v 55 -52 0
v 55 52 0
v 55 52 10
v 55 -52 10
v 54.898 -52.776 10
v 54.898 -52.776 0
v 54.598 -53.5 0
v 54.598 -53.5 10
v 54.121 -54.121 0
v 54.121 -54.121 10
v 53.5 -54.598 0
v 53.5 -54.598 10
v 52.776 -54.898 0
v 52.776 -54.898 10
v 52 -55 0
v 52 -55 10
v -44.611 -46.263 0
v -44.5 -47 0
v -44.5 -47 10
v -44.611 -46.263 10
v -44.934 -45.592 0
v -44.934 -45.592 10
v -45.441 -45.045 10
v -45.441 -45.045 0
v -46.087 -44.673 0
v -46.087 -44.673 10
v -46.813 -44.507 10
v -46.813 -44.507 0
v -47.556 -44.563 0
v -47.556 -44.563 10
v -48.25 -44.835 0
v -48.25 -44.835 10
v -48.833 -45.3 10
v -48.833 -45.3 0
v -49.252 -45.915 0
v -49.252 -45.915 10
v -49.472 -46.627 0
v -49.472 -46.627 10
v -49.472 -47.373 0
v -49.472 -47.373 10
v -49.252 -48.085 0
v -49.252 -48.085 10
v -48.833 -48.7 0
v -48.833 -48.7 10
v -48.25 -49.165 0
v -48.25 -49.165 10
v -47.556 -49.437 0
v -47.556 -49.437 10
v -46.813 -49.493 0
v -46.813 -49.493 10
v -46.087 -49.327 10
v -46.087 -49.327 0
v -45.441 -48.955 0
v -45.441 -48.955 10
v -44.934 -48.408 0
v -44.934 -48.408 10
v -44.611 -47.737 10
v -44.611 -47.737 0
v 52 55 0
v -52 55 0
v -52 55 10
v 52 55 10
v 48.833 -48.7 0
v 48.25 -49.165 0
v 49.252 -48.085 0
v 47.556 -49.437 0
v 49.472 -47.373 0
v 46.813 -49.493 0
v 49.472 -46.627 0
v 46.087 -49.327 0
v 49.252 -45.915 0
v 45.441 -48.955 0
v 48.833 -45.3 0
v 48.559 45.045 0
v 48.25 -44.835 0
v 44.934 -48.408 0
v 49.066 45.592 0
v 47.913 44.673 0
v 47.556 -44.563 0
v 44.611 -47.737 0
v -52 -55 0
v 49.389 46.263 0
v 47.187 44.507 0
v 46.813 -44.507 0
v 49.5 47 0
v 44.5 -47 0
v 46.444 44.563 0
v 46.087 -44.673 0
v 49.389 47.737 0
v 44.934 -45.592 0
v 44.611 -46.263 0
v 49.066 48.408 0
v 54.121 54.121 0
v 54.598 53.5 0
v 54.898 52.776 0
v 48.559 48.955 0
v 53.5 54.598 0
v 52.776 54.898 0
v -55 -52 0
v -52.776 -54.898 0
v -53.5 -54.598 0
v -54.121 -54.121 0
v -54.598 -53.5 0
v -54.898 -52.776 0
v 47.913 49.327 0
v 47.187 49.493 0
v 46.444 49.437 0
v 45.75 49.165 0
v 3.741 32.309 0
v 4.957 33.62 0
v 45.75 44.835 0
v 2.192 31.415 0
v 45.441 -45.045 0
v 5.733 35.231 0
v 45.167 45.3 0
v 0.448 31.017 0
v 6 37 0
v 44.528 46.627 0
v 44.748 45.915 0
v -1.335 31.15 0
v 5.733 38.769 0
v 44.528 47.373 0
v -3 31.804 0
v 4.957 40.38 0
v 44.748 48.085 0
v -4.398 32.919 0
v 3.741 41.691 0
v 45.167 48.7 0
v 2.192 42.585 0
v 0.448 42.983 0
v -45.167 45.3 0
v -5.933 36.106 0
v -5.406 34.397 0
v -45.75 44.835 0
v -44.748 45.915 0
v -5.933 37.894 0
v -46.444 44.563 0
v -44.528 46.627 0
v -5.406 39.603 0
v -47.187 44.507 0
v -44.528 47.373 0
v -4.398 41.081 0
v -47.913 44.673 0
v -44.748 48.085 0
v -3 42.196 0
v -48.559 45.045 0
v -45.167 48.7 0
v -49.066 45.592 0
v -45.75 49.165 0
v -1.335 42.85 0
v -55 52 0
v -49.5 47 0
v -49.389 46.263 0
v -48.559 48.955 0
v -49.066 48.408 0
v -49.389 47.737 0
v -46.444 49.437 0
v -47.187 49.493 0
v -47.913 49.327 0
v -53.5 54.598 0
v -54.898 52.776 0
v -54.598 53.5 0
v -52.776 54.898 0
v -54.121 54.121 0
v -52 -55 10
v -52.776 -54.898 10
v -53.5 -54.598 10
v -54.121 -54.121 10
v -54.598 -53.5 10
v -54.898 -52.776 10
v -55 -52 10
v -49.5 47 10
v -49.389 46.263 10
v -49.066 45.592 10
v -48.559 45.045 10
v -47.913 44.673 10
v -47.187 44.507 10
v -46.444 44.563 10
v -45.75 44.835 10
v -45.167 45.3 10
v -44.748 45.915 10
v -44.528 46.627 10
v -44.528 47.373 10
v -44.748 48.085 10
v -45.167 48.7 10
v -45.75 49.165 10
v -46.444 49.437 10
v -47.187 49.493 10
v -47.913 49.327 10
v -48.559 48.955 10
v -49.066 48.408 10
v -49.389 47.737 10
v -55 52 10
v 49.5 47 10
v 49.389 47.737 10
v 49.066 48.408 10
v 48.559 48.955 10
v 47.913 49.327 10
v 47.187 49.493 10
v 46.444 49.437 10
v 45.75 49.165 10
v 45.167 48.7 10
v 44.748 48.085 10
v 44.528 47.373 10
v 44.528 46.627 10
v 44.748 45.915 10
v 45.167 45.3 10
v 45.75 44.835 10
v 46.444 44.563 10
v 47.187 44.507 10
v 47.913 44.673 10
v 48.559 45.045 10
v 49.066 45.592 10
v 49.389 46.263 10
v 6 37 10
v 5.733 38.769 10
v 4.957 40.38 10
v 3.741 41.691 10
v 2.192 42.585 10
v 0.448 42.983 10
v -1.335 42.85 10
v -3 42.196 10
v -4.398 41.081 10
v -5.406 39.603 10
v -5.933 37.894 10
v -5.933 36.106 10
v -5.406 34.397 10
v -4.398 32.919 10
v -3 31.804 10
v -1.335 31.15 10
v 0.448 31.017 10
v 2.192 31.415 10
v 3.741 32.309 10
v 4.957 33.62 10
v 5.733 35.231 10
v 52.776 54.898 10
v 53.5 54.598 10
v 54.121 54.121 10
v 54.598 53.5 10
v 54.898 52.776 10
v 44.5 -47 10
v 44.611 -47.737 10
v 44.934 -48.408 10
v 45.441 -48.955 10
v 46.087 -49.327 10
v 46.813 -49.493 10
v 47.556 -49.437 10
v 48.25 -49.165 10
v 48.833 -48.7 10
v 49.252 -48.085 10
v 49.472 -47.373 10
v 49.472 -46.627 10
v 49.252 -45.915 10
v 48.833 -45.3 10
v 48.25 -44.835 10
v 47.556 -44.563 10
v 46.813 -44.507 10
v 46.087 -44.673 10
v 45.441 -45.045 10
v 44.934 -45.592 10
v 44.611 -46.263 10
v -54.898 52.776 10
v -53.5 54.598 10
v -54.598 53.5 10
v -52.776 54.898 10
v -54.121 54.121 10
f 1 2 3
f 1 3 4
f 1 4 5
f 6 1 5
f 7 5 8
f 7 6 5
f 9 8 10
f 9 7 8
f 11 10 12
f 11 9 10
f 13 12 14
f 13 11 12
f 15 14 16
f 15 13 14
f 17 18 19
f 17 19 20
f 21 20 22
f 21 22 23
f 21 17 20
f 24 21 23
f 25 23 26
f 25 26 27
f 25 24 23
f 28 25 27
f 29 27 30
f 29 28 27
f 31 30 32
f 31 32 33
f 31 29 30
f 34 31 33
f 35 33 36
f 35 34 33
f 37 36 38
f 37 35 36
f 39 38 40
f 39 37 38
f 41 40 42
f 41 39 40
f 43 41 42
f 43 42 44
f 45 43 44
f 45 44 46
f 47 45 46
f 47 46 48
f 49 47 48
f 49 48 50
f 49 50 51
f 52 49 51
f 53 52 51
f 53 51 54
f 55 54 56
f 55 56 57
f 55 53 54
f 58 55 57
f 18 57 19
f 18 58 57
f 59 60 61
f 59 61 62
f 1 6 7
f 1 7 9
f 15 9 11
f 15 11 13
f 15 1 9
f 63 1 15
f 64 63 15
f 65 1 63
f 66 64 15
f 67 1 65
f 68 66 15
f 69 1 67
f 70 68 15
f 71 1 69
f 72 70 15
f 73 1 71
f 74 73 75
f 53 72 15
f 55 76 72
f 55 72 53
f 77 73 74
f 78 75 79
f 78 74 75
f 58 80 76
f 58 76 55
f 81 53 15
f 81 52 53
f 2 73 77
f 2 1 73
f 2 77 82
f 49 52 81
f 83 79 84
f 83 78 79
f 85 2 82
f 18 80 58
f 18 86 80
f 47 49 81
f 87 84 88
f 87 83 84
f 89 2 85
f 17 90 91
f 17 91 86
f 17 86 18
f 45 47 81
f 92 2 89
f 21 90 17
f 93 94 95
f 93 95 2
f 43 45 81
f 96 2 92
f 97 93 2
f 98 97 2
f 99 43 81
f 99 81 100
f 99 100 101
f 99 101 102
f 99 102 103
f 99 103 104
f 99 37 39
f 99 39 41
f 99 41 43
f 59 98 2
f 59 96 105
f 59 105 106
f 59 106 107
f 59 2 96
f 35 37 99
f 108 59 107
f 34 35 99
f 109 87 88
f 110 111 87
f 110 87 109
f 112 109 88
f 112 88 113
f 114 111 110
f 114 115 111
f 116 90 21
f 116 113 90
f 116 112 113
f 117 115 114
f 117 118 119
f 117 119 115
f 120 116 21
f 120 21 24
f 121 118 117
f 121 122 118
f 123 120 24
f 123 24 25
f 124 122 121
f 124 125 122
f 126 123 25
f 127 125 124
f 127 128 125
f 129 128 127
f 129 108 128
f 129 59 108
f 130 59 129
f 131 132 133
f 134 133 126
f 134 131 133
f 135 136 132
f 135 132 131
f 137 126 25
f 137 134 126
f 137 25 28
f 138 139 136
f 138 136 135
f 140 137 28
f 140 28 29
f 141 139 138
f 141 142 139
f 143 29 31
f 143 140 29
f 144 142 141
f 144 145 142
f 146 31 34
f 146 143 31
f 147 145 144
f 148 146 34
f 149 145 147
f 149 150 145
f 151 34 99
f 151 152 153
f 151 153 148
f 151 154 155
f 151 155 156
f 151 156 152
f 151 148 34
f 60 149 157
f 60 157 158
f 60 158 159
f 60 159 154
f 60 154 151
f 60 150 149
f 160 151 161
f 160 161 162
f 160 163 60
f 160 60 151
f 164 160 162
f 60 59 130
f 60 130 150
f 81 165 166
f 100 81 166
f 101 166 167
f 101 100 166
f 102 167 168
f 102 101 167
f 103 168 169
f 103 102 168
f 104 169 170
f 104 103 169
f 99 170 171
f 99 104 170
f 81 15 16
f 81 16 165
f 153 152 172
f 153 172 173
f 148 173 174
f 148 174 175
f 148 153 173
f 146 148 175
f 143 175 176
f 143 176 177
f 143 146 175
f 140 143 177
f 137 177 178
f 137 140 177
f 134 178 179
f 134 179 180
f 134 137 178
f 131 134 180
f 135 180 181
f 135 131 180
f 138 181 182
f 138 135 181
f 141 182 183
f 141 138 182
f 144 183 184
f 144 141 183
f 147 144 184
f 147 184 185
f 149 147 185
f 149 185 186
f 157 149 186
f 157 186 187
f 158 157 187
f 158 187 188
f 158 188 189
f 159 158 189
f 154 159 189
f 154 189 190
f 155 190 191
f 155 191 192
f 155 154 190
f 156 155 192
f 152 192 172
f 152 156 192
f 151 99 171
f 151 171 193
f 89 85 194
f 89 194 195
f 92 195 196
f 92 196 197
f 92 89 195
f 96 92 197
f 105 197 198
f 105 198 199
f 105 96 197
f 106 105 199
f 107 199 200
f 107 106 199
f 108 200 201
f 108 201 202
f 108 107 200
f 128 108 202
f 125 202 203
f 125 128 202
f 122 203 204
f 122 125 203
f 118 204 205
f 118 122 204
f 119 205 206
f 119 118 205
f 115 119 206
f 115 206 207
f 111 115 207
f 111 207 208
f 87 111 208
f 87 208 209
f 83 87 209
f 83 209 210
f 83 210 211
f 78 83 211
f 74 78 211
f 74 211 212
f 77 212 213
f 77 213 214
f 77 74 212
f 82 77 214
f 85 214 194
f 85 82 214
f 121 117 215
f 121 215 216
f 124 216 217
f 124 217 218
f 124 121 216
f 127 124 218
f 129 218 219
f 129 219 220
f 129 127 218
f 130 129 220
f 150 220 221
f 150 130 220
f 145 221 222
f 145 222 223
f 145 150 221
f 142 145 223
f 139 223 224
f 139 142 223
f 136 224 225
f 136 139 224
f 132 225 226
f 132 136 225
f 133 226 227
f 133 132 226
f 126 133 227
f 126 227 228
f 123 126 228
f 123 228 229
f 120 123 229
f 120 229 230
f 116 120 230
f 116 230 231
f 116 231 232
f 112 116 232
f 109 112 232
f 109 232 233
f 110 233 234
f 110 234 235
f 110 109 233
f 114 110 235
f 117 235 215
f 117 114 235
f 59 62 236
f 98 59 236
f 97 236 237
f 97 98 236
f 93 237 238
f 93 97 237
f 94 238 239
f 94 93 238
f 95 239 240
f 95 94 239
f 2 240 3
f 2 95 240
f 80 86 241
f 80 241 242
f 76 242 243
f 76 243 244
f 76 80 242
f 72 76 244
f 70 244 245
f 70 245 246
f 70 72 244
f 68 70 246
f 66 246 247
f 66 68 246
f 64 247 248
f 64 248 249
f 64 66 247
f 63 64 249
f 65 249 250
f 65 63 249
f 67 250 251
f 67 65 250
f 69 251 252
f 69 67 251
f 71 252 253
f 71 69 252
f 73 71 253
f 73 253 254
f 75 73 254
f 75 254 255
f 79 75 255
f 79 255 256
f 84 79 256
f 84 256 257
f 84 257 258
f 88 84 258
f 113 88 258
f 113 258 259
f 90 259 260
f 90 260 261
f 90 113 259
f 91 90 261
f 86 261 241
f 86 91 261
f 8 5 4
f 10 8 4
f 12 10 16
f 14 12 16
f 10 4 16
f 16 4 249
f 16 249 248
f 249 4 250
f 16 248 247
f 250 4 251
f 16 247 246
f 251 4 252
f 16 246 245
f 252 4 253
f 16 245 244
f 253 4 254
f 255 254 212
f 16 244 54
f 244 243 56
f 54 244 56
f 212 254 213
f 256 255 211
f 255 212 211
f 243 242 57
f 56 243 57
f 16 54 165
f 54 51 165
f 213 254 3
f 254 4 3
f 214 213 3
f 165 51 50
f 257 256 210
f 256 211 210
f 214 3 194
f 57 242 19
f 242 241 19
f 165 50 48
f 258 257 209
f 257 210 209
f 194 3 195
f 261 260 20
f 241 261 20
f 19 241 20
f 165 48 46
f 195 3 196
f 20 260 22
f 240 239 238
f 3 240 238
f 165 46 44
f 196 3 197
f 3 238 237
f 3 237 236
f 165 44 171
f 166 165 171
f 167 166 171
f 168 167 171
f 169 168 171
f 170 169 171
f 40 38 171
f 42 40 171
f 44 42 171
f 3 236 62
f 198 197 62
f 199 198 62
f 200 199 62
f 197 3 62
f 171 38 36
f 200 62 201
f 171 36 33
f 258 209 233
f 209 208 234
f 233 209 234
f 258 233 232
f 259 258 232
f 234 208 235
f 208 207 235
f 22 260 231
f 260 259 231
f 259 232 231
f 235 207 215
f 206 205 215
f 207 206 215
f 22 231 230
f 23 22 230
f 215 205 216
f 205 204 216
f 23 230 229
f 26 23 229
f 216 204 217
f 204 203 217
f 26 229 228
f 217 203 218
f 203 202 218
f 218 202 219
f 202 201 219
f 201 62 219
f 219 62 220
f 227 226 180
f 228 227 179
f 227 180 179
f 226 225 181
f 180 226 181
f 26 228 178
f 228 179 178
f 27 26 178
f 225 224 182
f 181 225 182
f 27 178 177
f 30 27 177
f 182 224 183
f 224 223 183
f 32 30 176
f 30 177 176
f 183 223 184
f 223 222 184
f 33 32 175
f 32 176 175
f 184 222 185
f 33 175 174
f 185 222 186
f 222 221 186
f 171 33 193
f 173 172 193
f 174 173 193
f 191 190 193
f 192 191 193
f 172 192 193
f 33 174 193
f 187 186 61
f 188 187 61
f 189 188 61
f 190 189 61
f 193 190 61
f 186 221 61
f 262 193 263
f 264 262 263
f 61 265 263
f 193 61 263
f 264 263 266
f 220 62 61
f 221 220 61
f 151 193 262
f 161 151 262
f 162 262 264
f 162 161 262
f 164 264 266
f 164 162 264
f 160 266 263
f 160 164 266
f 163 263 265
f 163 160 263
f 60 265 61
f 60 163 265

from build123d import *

# Parameters (mm, degrees)
SKETCH1_R           = 2.5
SKETCH1_R_2         = 6
BOSS_EXTRUDE1_DEPTH = 10


with BuildPart() as part:
    # Sketch1 → Boss-Extrude1 (new body)
    with BuildSketch(Plane.XY):
        with BuildLine():
            Line((-52, 55), (52, 55))
            ThreePointArc((52, 55), (54.121320344, 54.121320344), (55, 52))
            Line((55, 52), (55, -52))
            ThreePointArc((55, -52), (54.121320344, -54.121320344), (52, -55))
            Line((52, -55), (-52, -55))
            ThreePointArc((-52, -55), (-54.121320344, -54.121320344), (-55, -52))
            Line((-55, -52), (-55, 52))
            ThreePointArc((-55, 52), (-54.121320344, 54.121320344), (-52, 55))
        make_face()
        with Locations((47, 47)):
            Circle(SKETCH1_R, mode=Mode.SUBTRACT)
        with Locations(Location((47, -47, 0), (0, 0, 180))):
            Circle(SKETCH1_R, mode=Mode.SUBTRACT)
        with Locations((-47, -47)):
            Circle(SKETCH1_R, mode=Mode.SUBTRACT)
        with Locations(Location((-47, 47, 0), (0, 0, 180))):
            Circle(SKETCH1_R, mode=Mode.SUBTRACT)
        with Locations((0, 37)):
            Circle(SKETCH1_R_2, mode=Mode.SUBTRACT)
    extrude(amount=BOSS_EXTRUDE1_DEPTH)


solid = part.part
